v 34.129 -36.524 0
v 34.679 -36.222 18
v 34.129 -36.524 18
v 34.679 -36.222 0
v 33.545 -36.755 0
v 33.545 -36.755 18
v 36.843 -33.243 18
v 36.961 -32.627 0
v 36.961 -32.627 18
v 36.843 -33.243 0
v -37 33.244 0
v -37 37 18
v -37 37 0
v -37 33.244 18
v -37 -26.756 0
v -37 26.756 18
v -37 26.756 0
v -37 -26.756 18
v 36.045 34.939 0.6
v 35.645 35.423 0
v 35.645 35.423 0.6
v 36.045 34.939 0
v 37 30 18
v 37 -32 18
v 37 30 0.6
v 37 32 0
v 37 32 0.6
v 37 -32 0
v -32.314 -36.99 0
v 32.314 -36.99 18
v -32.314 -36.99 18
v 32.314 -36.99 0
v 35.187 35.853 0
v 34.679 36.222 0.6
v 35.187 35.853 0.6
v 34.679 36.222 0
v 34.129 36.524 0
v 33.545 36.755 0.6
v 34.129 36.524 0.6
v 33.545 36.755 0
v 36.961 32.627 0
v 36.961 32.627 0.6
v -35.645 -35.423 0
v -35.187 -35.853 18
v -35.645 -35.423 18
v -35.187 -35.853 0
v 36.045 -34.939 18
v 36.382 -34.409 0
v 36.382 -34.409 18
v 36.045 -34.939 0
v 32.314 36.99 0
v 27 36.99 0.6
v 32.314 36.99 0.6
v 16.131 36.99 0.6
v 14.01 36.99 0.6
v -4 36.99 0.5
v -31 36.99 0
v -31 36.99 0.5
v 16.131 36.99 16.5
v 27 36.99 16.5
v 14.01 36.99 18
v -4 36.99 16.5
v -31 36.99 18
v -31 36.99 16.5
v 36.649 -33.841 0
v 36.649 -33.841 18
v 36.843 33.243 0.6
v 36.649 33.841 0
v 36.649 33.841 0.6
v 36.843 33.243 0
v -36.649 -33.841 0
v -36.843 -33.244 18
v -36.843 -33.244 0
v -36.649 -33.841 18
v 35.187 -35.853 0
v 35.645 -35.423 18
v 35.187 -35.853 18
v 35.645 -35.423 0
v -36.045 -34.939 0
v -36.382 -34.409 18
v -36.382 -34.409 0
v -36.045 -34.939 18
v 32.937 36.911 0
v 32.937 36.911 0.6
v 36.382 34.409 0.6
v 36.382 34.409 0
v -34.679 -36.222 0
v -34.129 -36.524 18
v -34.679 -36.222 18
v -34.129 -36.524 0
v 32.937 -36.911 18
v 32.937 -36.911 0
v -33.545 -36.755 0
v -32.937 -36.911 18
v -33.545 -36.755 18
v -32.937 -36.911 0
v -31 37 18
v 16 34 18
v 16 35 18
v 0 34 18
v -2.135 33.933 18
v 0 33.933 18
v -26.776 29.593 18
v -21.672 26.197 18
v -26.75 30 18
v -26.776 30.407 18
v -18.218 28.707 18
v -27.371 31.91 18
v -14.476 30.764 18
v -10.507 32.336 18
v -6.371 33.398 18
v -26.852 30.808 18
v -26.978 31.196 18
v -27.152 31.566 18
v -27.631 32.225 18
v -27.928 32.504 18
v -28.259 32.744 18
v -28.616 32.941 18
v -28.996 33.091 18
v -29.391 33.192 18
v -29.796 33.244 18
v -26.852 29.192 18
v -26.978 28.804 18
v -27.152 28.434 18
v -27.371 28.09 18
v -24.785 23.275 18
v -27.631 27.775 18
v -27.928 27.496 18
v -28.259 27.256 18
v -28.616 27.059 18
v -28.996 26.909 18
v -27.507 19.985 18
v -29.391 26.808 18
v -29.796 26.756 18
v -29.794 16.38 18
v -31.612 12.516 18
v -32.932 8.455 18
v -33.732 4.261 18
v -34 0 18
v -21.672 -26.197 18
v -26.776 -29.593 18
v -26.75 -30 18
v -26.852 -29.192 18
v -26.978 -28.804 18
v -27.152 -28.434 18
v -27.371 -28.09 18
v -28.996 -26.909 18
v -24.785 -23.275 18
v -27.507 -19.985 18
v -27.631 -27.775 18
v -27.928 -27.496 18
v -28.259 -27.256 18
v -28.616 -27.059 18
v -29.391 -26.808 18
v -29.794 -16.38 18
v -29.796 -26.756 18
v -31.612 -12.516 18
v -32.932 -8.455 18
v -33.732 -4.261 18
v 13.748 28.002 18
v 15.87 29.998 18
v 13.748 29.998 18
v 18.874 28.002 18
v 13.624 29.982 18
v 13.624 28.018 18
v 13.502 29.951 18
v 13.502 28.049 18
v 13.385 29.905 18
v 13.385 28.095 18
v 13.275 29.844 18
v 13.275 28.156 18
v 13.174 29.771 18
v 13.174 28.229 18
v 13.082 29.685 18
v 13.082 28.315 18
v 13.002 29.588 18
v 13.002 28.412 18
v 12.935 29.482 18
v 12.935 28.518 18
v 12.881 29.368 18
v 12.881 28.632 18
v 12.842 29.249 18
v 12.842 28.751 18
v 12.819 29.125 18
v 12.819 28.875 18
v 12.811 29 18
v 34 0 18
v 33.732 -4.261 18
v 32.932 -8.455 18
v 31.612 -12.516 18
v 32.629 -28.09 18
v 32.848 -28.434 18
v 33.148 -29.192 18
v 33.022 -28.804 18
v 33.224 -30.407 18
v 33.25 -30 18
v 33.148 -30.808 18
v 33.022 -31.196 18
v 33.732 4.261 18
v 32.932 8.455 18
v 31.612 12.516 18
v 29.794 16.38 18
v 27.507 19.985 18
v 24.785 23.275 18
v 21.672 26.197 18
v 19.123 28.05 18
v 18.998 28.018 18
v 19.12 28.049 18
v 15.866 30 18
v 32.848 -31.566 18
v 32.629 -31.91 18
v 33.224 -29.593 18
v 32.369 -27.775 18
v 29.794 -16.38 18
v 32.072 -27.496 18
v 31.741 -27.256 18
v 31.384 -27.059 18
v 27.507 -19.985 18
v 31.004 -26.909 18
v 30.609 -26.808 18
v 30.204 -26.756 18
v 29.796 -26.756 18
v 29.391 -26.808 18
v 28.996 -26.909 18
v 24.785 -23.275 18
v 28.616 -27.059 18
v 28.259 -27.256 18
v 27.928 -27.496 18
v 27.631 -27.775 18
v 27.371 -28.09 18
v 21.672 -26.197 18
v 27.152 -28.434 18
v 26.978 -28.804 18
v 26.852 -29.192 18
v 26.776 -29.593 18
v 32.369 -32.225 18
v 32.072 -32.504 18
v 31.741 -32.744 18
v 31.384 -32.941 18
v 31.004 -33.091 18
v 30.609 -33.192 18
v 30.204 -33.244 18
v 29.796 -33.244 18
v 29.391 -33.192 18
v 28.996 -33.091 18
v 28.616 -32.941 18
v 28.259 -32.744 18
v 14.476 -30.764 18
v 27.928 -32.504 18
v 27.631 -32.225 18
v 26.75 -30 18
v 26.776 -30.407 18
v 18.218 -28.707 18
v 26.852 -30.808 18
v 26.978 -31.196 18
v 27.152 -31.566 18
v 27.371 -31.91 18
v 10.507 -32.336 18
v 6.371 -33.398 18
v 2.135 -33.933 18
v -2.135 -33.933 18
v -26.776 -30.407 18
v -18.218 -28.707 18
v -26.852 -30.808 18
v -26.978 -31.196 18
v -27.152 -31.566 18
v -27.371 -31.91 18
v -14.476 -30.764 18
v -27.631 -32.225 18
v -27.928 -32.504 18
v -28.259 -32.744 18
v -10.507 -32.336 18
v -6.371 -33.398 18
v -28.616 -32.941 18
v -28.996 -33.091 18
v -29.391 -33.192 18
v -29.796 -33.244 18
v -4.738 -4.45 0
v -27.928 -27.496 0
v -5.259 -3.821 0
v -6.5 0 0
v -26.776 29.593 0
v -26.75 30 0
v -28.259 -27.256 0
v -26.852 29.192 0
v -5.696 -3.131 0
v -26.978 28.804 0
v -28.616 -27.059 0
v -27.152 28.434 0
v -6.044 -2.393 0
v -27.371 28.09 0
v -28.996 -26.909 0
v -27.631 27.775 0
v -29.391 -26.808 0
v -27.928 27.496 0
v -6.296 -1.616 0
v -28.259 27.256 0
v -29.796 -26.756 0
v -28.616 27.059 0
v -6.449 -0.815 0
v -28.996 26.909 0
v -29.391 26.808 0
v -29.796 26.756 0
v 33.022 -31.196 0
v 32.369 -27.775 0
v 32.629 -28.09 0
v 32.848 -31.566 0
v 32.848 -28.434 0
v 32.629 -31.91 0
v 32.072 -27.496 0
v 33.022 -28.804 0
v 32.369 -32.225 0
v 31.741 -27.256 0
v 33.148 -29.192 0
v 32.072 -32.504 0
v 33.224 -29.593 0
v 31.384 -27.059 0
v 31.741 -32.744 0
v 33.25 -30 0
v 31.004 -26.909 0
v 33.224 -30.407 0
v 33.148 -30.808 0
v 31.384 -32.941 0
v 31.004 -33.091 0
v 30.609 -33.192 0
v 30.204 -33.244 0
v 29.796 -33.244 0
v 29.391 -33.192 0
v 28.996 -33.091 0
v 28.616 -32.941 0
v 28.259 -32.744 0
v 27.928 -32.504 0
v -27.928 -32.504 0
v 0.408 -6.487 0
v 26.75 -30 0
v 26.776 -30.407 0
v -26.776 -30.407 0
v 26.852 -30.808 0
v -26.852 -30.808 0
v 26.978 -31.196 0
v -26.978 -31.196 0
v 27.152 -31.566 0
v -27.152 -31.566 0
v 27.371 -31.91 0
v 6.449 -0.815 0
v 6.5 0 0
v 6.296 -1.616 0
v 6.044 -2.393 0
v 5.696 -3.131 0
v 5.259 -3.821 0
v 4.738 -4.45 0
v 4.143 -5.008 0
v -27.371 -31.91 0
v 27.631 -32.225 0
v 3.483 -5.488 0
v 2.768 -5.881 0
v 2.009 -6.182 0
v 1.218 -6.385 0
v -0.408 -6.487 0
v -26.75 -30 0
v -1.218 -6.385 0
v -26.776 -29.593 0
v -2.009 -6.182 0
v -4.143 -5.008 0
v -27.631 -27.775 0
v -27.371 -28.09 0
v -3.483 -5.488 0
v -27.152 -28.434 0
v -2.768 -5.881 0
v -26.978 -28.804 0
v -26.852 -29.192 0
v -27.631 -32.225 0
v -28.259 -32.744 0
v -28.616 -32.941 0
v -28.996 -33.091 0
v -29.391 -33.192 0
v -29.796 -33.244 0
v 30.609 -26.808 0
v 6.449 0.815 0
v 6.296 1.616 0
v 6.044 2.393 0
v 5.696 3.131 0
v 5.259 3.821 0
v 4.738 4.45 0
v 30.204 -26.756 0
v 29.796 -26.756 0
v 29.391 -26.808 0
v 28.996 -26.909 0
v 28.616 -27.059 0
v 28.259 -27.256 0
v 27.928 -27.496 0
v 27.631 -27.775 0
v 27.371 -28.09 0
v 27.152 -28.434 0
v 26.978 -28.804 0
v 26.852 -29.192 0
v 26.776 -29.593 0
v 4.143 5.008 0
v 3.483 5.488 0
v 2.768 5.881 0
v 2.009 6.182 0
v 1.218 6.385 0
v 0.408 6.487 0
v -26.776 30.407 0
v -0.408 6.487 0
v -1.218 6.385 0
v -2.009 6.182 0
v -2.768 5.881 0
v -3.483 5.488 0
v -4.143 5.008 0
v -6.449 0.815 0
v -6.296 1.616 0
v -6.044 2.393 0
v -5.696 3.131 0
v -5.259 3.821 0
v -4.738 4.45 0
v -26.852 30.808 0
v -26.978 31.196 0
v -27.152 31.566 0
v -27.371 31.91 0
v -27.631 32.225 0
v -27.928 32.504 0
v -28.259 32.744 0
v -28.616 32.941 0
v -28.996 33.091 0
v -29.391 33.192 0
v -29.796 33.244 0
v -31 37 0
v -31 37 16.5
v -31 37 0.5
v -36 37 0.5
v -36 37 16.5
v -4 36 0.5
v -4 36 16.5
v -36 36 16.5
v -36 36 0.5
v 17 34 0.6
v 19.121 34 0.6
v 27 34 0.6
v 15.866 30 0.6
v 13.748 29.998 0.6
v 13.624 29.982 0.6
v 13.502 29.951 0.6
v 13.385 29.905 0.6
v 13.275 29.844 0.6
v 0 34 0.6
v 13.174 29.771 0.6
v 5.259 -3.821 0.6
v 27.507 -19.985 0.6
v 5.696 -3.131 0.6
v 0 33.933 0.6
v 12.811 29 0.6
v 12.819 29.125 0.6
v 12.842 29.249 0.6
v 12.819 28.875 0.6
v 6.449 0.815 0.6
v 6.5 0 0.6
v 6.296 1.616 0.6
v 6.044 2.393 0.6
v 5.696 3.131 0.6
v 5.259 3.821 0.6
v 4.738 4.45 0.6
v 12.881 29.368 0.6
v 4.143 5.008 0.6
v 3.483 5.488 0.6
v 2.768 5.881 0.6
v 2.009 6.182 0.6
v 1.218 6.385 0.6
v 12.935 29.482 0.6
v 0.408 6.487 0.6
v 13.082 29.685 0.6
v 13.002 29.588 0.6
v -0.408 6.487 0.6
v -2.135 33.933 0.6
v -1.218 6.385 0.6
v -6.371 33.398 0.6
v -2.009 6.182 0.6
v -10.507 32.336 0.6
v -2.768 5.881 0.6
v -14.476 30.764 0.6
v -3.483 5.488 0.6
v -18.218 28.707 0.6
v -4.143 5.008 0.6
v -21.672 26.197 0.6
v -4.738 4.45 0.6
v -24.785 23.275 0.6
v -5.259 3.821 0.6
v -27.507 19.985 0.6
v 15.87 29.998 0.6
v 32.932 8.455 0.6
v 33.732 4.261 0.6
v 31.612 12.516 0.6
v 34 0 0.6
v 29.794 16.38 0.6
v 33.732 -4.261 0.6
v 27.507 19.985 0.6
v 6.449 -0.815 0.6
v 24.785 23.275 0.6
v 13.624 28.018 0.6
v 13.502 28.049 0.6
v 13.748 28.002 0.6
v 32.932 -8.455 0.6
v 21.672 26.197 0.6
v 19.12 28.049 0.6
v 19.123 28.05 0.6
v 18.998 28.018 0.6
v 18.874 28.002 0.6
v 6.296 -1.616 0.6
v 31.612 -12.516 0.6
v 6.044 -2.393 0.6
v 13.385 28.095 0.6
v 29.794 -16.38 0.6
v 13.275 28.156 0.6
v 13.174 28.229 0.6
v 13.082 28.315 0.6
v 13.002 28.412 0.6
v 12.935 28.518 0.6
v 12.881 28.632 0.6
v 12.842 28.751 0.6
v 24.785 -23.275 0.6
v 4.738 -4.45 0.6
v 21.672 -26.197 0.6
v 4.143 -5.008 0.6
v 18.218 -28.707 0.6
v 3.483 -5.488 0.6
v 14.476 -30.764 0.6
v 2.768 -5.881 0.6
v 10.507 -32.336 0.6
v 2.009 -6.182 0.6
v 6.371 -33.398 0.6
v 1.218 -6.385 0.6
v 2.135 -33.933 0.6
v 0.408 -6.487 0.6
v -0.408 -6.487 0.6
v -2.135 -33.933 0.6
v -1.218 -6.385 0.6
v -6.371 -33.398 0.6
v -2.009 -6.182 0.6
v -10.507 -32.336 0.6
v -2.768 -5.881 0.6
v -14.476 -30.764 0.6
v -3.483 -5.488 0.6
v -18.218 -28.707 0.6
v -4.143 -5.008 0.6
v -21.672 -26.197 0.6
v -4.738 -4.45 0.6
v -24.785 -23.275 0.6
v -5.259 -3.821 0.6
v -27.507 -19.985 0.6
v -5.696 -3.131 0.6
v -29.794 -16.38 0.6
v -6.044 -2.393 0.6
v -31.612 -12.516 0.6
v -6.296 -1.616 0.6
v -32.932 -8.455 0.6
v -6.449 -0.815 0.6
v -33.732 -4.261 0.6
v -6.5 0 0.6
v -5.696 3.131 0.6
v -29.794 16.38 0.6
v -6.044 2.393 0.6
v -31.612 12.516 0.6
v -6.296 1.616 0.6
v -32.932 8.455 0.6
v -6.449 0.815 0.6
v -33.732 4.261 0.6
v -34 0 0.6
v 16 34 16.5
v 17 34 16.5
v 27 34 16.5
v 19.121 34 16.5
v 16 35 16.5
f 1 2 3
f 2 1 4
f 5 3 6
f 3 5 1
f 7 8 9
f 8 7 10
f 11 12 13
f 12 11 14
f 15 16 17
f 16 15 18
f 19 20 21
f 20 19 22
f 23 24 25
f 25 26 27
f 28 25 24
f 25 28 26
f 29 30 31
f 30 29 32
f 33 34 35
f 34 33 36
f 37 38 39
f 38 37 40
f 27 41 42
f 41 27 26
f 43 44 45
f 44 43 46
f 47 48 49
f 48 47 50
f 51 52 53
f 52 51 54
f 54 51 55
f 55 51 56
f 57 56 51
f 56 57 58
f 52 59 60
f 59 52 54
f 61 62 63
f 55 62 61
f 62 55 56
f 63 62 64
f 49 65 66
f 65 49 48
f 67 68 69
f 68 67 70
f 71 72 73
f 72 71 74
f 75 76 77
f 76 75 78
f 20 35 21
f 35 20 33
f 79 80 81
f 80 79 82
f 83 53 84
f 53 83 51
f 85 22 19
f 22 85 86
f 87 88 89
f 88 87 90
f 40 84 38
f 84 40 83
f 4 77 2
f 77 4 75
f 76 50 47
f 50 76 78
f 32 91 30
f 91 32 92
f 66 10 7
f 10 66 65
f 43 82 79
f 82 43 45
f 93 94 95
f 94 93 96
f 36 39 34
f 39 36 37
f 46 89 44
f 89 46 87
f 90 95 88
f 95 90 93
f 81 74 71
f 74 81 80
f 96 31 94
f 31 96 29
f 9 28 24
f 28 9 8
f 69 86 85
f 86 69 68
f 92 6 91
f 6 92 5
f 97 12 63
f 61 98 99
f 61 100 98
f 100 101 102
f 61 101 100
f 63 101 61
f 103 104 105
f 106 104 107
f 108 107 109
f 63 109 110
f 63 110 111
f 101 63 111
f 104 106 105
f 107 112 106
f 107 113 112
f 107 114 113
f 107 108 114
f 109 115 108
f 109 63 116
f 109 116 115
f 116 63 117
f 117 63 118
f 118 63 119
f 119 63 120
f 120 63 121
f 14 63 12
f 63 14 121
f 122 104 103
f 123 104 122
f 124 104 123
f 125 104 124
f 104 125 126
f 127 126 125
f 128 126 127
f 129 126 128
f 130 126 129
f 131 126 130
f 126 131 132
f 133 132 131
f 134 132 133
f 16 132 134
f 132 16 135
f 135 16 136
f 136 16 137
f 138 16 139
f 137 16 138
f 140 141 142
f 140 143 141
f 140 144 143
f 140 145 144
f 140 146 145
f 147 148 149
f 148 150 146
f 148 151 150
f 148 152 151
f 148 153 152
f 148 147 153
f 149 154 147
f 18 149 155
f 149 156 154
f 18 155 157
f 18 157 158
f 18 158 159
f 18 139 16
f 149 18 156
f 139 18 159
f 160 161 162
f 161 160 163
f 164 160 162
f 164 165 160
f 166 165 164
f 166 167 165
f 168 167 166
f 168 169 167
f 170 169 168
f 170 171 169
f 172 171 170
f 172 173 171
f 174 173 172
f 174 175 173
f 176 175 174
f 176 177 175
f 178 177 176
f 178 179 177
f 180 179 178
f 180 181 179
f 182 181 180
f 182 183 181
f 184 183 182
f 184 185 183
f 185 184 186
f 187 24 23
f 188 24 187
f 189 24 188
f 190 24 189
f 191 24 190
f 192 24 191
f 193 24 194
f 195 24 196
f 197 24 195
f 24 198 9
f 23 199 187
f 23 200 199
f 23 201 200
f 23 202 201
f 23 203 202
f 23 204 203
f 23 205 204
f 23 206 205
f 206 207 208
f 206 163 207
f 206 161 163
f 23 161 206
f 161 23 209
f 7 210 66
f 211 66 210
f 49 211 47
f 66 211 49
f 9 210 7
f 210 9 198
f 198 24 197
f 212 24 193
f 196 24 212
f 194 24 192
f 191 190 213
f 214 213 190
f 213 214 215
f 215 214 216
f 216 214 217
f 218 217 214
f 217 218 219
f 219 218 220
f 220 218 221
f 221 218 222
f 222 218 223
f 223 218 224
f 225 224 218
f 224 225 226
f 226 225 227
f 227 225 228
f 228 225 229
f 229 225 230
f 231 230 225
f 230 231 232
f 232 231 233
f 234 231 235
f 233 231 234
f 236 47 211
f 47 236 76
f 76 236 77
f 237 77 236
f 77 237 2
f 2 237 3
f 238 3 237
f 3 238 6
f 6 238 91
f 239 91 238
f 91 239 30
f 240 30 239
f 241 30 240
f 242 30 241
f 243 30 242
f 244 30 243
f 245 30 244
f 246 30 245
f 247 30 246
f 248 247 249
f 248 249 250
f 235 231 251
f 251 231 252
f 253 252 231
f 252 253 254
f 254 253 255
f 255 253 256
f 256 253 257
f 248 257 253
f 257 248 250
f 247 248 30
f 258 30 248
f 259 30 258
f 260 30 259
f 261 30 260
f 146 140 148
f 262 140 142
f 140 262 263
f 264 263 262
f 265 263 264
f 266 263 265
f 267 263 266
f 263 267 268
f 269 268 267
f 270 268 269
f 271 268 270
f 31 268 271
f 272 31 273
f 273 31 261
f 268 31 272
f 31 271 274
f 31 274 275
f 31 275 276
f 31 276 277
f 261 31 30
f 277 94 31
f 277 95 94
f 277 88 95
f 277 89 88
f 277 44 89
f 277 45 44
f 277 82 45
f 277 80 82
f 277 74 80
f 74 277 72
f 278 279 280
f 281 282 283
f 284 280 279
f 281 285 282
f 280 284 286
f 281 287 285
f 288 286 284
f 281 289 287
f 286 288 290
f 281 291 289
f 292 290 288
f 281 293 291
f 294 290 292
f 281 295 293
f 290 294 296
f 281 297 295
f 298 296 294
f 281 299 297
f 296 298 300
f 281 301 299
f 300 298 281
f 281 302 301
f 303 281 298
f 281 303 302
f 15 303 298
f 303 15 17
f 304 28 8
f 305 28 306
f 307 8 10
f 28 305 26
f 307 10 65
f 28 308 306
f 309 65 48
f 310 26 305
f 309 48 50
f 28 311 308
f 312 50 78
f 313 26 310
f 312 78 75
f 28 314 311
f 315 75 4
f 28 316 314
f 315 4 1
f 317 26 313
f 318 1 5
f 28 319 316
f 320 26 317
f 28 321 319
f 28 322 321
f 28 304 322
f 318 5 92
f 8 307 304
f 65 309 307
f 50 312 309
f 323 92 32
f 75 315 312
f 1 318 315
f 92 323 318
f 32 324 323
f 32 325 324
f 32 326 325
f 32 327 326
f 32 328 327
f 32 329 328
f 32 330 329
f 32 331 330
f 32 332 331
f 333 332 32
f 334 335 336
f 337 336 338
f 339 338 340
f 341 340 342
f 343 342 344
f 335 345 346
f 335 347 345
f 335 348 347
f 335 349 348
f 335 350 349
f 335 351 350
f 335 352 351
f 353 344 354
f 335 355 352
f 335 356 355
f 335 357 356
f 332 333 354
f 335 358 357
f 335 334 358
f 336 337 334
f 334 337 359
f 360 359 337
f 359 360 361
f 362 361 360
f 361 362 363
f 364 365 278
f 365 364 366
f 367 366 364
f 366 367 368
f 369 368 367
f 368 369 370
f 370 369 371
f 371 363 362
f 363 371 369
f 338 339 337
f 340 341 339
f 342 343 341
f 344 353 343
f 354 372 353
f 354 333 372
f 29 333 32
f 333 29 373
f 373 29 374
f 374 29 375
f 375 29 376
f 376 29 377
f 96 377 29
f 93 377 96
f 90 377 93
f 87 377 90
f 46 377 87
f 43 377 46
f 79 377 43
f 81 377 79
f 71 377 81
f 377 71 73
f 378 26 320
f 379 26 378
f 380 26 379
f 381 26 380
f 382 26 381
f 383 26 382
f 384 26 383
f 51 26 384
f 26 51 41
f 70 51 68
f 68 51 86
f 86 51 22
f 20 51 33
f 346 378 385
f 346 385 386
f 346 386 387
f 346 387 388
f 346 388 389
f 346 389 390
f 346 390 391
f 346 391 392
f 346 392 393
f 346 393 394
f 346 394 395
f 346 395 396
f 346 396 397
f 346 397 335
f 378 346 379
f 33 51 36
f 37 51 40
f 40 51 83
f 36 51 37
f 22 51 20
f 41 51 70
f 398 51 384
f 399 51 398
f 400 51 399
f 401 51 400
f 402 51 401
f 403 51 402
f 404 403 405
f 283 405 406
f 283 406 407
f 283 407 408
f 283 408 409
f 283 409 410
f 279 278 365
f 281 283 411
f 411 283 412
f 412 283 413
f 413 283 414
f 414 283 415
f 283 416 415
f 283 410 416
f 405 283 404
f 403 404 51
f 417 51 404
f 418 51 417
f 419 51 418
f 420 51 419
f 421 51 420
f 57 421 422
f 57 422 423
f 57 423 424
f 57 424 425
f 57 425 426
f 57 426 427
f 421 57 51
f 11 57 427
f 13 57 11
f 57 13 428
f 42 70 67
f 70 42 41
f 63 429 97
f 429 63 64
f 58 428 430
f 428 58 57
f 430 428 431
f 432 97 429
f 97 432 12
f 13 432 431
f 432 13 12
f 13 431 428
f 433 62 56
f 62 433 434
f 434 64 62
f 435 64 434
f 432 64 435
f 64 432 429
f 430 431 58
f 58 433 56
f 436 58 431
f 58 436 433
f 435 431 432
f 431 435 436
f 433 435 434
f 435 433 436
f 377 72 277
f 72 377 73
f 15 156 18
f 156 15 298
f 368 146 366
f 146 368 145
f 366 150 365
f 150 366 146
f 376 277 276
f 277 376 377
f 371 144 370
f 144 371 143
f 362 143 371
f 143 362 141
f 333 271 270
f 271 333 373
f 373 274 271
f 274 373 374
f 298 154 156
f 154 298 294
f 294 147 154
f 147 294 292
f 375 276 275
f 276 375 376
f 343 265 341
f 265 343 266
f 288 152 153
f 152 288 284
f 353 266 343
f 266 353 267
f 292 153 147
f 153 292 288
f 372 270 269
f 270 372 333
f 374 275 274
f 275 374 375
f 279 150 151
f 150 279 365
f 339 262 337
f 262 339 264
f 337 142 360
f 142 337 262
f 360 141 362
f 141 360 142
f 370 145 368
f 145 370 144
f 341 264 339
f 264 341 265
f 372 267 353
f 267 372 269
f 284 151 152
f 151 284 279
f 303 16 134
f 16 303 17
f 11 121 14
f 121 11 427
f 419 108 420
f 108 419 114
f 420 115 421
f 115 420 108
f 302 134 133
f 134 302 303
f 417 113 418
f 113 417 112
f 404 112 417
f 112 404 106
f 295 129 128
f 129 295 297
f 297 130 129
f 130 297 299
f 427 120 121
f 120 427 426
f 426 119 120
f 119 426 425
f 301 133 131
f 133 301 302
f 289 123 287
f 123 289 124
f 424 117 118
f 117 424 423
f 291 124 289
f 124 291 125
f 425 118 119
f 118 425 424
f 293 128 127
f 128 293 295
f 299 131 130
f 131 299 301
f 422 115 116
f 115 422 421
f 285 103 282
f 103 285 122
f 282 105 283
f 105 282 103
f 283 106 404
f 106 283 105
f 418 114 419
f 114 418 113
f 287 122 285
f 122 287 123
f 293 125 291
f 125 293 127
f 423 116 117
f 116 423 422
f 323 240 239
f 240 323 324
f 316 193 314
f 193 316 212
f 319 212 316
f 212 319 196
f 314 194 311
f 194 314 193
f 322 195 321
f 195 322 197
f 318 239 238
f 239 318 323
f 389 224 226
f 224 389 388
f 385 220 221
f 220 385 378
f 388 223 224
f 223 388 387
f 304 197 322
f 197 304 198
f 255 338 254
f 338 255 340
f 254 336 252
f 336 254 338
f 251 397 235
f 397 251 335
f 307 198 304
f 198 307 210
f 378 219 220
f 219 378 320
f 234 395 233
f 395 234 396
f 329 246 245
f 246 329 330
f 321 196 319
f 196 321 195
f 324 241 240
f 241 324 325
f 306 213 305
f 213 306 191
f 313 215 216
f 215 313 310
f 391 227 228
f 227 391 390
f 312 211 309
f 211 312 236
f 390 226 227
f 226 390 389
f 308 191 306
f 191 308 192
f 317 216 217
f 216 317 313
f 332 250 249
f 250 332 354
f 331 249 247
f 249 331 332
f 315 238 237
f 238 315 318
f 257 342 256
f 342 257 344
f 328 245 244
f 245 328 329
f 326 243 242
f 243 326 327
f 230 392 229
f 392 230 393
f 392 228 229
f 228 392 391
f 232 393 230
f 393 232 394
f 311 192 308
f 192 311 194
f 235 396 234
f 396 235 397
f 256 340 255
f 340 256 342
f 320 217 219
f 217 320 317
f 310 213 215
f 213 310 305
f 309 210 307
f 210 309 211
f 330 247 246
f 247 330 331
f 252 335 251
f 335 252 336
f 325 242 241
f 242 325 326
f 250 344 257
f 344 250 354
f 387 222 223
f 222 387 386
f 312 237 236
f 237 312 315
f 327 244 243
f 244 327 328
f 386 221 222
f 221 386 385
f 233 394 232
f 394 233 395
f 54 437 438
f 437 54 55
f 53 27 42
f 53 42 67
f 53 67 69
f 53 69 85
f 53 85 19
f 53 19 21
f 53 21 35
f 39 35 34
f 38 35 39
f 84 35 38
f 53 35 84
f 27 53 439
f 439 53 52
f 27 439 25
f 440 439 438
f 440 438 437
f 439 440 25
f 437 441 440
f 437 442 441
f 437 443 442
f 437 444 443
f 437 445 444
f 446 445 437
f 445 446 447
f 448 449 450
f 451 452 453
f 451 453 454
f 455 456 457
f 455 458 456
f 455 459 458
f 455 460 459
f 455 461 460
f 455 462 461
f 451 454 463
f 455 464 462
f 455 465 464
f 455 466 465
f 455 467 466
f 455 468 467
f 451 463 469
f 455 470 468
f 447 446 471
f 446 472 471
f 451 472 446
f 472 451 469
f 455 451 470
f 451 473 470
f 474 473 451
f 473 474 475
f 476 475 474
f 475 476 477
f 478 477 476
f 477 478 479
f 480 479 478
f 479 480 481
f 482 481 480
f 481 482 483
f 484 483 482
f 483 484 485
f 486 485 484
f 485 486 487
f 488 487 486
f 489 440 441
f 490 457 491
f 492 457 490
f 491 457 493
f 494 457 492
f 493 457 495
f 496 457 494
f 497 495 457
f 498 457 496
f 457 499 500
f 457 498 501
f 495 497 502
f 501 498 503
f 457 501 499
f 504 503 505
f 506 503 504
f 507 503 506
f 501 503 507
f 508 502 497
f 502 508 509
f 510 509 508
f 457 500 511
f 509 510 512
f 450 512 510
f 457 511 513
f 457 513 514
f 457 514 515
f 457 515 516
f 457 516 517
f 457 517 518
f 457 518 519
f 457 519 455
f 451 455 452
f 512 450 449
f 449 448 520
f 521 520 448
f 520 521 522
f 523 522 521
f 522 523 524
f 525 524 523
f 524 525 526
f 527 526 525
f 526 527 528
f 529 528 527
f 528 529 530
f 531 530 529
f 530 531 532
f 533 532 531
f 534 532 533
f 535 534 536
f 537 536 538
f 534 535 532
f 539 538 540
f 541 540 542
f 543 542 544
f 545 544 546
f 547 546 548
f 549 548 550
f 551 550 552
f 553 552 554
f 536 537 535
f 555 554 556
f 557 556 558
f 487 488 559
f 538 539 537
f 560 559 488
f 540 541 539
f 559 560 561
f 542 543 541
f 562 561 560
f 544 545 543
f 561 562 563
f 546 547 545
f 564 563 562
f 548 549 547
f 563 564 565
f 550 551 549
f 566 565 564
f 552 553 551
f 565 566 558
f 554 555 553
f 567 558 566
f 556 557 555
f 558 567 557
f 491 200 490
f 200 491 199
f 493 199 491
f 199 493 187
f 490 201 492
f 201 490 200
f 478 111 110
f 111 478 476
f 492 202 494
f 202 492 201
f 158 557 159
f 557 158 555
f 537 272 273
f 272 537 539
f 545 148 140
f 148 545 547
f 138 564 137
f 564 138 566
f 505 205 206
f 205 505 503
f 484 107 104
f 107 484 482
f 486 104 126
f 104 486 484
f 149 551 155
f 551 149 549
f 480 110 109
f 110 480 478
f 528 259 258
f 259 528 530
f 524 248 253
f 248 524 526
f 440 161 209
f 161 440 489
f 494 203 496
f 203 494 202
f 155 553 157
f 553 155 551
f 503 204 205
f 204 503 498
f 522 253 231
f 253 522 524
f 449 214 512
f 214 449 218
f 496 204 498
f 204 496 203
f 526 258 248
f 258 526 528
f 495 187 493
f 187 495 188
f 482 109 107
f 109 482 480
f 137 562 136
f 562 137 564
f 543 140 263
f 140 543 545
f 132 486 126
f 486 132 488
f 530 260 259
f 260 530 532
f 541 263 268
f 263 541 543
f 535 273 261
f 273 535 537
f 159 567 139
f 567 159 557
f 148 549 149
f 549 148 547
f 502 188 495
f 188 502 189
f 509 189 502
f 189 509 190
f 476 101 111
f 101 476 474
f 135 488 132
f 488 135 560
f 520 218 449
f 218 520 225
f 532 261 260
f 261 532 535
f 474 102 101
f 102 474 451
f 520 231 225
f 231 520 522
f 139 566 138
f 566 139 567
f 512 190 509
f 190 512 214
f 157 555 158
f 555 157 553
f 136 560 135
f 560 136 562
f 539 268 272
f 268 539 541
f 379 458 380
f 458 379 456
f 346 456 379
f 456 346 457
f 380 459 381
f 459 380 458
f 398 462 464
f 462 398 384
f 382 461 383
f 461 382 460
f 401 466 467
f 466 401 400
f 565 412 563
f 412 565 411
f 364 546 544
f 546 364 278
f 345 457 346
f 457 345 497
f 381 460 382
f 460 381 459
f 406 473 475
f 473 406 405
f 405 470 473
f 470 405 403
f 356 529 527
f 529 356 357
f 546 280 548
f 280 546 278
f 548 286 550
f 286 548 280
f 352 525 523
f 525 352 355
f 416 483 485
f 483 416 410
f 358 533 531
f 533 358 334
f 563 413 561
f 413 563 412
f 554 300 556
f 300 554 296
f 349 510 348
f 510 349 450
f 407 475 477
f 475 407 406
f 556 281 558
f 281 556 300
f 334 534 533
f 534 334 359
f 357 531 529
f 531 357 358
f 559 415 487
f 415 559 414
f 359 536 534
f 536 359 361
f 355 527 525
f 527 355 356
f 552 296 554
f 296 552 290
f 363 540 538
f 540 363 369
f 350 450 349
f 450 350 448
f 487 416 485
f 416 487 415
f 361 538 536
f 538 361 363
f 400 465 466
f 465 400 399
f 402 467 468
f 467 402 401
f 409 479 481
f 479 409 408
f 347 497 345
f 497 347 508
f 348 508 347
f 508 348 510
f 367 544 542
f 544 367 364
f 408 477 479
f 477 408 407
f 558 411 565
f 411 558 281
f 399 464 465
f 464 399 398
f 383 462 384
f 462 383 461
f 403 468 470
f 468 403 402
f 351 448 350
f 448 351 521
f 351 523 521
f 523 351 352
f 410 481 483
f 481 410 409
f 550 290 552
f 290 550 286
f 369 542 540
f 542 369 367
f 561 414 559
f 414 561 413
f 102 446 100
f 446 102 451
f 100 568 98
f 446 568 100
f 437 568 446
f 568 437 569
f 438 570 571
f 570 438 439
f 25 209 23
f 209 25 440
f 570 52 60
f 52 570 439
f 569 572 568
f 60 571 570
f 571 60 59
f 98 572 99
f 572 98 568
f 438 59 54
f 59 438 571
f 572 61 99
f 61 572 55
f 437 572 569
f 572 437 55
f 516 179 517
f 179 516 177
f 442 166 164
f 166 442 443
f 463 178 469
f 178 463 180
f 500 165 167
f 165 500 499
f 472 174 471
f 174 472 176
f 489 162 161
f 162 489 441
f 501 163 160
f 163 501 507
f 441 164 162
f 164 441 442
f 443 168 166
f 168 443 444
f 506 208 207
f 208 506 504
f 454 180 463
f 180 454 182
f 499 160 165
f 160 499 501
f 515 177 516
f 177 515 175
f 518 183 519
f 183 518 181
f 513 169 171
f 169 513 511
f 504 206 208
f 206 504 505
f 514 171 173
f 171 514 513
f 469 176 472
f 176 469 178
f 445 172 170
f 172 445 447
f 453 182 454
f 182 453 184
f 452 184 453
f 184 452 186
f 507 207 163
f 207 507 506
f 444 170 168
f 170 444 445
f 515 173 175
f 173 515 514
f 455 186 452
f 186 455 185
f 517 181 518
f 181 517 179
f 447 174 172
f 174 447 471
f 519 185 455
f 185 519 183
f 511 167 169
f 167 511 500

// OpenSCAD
$fn = 50;


union() {
	difference() {
		union() {
			translate(v = [0, 0, 0]) {
				rotate(a = [0, 0, 0]) {
					hull() {
						translate(v = [-32.0000000000, 32.0000000000, 0]) {
							rotate(a = [0, 0, 0]) {
								translate(v = [0, 0, 0]) {
									rotate(a = [0, 0, 0]) {
										cylinder(h = 18, r = 5);
									}
								}
							}
						}
						translate(v = [32.0000000000, 32.0000000000, 0]) {
							rotate(a = [0, 0, 0]) {
								translate(v = [0, 0, 0]) {
									rotate(a = [0, 0, 0]) {
										cylinder(h = 18, r = 5);
									}
								}
							}
						}
						translate(v = [-32.0000000000, -32.0000000000, 0]) {
							rotate(a = [0, 0, 0]) {
								translate(v = [0, 0, 0]) {
									rotate(a = [0, 0, 0]) {
										cylinder(h = 18, r = 5);
									}
								}
							}
						}
						translate(v = [32.0000000000, -32.0000000000, 0]) {
							rotate(a = [0, 0, 0]) {
								translate(v = [0, 0, 0]) {
									rotate(a = [0, 0, 0]) {
										cylinder(h = 18, r = 5);
									}
								}
							}
						}
					}
				}
			}
			translate(v = [-37.0000000000, 31.0000000000, 0]) {
				rotate(a = [0, 0, 0]) {
					cube(size = [6, 6, 18]);
				}
			}
		}
		union() {
			#translate(v = [-36.0000000000, 36.0000000000, 0.5000000000]) {
				rotate(a = [0, 0, 0]) {
					cube(size = [32, 1, 16]);
				}
			}
			translate(v = [-37.5000000000, -30.0000000000, -125]) {
				rotate(a = [0, 0, 0]) {
					hull() {
						translate(v = [7.5000000000, 0, 0]) {
							rotate(a = [0, 0, 0]) {
								translate(v = [0, 0, 0]) {
									rotate(a = [0, 0, 0]) {
										cylinder(h = 250, r = 3.2500000000);
									}
								}
							}
						}
						translate(v = [-7.5000000000, 0, 0]) {
							rotate(a = [0, 0, 0]) {
								translate(v = [0, 0, 0]) {
									rotate(a = [0, 0, 0]) {
										cylinder(h = 250, r = 3.2500000000);
									}
								}
							}
						}
					}
				}
			}
			translate(v = [-37.5000000000, 30.0000000000, -125]) {
				rotate(a = [0, 0, 0]) {
					hull() {
						translate(v = [7.5000000000, 0, 0]) {
							rotate(a = [0, 0, 0]) {
								translate(v = [0, 0, 0]) {
									rotate(a = [0, 0, 0]) {
										cylinder(h = 250, r = 3.2500000000);
									}
								}
							}
						}
						translate(v = [-7.5000000000, 0, 0]) {
							rotate(a = [0, 0, 0]) {
								translate(v = [0, 0, 0]) {
									rotate(a = [0, 0, 0]) {
										cylinder(h = 250, r = 3.2500000000);
									}
								}
							}
						}
					}
				}
			}
			translate(v = [30.0000000000, -30.0000000000, -125.0000000000]) {
				rotate(a = [0, 0, 0]) {
					cylinder(h = 250, r = 3.2500000000);
				}
			}
			translate(v = [0, 0, 0.6000000000]) {
				rotate(a = [0, 0, 0]) {
					cylinder(h = 20.4000000000, r = 34.0000000000);
				}
			}
			translate(v = [0, 0, -9.0000000000]) {
				rotate(a = [0, 0, 0]) {
					cylinder(h = 18, r = 6.5000000000);
				}
			}
			translate(v = [0.0000000000, 30.0000000000, 0.6000000000]) {
				rotate(a = [0, 0, 0]) {
					cube(size = [37.0000000000, 4, 20.4000000000]);
				}
			}
			translate(v = [27.0000000000, 30.0000000000, 0.6000000000]) {
				rotate(a = [0, 0, 0]) {
					cube(size = [10, 7, 20.4000000000]);
				}
			}
			translate(v = [16.0000000000, 30.0000000000, 16.5000000000]) {
				rotate(a = [0, 0, 0]) {
					cube(size = [21, 7, 1.5000000000]);
				}
			}
			translate(v = [13.2500000000, 37.7500000000, 0.6000000000]) {
				rotate(a = [0, 0, -45]) {
					cube(size = [7.5000000000, 1.5000000000, 20.4000000000]);
				}
			}
			translate(v = [7.0610000000, 28.0000000000, 0.6000000000]) {
				rotate(a = [0, 0, 0]) {
					cube(size = [7.5000000000, 2, 17.4000000000]);
				}
			}
		}
	}
	union() {
		translate(v = [16.3110000000, 29.0000000000, 0]) {
			rotate(a = [0, 0, 0]) {
				hull() {
					translate(v = [2.5000000000, 0, 0]) {
						rotate(a = [0, 0, 0]) {
							#translate(v = [0, 0, 0]) {
								rotate(a = [0, 0, 0]) {
									cylinder(h = 18, r = 1.0000000000);
								}
							}
						}
					}
					translate(v = [-2.5000000000, 0, 0]) {
						rotate(a = [0, 0, 0]) {
							#translate(v = [0, 0, 0]) {
								rotate(a = [0, 0, 0]) {
									cylinder(h = 18, r = 1.0000000000);
								}
							}
						}
					}
				}
			}
		}
	}
}
